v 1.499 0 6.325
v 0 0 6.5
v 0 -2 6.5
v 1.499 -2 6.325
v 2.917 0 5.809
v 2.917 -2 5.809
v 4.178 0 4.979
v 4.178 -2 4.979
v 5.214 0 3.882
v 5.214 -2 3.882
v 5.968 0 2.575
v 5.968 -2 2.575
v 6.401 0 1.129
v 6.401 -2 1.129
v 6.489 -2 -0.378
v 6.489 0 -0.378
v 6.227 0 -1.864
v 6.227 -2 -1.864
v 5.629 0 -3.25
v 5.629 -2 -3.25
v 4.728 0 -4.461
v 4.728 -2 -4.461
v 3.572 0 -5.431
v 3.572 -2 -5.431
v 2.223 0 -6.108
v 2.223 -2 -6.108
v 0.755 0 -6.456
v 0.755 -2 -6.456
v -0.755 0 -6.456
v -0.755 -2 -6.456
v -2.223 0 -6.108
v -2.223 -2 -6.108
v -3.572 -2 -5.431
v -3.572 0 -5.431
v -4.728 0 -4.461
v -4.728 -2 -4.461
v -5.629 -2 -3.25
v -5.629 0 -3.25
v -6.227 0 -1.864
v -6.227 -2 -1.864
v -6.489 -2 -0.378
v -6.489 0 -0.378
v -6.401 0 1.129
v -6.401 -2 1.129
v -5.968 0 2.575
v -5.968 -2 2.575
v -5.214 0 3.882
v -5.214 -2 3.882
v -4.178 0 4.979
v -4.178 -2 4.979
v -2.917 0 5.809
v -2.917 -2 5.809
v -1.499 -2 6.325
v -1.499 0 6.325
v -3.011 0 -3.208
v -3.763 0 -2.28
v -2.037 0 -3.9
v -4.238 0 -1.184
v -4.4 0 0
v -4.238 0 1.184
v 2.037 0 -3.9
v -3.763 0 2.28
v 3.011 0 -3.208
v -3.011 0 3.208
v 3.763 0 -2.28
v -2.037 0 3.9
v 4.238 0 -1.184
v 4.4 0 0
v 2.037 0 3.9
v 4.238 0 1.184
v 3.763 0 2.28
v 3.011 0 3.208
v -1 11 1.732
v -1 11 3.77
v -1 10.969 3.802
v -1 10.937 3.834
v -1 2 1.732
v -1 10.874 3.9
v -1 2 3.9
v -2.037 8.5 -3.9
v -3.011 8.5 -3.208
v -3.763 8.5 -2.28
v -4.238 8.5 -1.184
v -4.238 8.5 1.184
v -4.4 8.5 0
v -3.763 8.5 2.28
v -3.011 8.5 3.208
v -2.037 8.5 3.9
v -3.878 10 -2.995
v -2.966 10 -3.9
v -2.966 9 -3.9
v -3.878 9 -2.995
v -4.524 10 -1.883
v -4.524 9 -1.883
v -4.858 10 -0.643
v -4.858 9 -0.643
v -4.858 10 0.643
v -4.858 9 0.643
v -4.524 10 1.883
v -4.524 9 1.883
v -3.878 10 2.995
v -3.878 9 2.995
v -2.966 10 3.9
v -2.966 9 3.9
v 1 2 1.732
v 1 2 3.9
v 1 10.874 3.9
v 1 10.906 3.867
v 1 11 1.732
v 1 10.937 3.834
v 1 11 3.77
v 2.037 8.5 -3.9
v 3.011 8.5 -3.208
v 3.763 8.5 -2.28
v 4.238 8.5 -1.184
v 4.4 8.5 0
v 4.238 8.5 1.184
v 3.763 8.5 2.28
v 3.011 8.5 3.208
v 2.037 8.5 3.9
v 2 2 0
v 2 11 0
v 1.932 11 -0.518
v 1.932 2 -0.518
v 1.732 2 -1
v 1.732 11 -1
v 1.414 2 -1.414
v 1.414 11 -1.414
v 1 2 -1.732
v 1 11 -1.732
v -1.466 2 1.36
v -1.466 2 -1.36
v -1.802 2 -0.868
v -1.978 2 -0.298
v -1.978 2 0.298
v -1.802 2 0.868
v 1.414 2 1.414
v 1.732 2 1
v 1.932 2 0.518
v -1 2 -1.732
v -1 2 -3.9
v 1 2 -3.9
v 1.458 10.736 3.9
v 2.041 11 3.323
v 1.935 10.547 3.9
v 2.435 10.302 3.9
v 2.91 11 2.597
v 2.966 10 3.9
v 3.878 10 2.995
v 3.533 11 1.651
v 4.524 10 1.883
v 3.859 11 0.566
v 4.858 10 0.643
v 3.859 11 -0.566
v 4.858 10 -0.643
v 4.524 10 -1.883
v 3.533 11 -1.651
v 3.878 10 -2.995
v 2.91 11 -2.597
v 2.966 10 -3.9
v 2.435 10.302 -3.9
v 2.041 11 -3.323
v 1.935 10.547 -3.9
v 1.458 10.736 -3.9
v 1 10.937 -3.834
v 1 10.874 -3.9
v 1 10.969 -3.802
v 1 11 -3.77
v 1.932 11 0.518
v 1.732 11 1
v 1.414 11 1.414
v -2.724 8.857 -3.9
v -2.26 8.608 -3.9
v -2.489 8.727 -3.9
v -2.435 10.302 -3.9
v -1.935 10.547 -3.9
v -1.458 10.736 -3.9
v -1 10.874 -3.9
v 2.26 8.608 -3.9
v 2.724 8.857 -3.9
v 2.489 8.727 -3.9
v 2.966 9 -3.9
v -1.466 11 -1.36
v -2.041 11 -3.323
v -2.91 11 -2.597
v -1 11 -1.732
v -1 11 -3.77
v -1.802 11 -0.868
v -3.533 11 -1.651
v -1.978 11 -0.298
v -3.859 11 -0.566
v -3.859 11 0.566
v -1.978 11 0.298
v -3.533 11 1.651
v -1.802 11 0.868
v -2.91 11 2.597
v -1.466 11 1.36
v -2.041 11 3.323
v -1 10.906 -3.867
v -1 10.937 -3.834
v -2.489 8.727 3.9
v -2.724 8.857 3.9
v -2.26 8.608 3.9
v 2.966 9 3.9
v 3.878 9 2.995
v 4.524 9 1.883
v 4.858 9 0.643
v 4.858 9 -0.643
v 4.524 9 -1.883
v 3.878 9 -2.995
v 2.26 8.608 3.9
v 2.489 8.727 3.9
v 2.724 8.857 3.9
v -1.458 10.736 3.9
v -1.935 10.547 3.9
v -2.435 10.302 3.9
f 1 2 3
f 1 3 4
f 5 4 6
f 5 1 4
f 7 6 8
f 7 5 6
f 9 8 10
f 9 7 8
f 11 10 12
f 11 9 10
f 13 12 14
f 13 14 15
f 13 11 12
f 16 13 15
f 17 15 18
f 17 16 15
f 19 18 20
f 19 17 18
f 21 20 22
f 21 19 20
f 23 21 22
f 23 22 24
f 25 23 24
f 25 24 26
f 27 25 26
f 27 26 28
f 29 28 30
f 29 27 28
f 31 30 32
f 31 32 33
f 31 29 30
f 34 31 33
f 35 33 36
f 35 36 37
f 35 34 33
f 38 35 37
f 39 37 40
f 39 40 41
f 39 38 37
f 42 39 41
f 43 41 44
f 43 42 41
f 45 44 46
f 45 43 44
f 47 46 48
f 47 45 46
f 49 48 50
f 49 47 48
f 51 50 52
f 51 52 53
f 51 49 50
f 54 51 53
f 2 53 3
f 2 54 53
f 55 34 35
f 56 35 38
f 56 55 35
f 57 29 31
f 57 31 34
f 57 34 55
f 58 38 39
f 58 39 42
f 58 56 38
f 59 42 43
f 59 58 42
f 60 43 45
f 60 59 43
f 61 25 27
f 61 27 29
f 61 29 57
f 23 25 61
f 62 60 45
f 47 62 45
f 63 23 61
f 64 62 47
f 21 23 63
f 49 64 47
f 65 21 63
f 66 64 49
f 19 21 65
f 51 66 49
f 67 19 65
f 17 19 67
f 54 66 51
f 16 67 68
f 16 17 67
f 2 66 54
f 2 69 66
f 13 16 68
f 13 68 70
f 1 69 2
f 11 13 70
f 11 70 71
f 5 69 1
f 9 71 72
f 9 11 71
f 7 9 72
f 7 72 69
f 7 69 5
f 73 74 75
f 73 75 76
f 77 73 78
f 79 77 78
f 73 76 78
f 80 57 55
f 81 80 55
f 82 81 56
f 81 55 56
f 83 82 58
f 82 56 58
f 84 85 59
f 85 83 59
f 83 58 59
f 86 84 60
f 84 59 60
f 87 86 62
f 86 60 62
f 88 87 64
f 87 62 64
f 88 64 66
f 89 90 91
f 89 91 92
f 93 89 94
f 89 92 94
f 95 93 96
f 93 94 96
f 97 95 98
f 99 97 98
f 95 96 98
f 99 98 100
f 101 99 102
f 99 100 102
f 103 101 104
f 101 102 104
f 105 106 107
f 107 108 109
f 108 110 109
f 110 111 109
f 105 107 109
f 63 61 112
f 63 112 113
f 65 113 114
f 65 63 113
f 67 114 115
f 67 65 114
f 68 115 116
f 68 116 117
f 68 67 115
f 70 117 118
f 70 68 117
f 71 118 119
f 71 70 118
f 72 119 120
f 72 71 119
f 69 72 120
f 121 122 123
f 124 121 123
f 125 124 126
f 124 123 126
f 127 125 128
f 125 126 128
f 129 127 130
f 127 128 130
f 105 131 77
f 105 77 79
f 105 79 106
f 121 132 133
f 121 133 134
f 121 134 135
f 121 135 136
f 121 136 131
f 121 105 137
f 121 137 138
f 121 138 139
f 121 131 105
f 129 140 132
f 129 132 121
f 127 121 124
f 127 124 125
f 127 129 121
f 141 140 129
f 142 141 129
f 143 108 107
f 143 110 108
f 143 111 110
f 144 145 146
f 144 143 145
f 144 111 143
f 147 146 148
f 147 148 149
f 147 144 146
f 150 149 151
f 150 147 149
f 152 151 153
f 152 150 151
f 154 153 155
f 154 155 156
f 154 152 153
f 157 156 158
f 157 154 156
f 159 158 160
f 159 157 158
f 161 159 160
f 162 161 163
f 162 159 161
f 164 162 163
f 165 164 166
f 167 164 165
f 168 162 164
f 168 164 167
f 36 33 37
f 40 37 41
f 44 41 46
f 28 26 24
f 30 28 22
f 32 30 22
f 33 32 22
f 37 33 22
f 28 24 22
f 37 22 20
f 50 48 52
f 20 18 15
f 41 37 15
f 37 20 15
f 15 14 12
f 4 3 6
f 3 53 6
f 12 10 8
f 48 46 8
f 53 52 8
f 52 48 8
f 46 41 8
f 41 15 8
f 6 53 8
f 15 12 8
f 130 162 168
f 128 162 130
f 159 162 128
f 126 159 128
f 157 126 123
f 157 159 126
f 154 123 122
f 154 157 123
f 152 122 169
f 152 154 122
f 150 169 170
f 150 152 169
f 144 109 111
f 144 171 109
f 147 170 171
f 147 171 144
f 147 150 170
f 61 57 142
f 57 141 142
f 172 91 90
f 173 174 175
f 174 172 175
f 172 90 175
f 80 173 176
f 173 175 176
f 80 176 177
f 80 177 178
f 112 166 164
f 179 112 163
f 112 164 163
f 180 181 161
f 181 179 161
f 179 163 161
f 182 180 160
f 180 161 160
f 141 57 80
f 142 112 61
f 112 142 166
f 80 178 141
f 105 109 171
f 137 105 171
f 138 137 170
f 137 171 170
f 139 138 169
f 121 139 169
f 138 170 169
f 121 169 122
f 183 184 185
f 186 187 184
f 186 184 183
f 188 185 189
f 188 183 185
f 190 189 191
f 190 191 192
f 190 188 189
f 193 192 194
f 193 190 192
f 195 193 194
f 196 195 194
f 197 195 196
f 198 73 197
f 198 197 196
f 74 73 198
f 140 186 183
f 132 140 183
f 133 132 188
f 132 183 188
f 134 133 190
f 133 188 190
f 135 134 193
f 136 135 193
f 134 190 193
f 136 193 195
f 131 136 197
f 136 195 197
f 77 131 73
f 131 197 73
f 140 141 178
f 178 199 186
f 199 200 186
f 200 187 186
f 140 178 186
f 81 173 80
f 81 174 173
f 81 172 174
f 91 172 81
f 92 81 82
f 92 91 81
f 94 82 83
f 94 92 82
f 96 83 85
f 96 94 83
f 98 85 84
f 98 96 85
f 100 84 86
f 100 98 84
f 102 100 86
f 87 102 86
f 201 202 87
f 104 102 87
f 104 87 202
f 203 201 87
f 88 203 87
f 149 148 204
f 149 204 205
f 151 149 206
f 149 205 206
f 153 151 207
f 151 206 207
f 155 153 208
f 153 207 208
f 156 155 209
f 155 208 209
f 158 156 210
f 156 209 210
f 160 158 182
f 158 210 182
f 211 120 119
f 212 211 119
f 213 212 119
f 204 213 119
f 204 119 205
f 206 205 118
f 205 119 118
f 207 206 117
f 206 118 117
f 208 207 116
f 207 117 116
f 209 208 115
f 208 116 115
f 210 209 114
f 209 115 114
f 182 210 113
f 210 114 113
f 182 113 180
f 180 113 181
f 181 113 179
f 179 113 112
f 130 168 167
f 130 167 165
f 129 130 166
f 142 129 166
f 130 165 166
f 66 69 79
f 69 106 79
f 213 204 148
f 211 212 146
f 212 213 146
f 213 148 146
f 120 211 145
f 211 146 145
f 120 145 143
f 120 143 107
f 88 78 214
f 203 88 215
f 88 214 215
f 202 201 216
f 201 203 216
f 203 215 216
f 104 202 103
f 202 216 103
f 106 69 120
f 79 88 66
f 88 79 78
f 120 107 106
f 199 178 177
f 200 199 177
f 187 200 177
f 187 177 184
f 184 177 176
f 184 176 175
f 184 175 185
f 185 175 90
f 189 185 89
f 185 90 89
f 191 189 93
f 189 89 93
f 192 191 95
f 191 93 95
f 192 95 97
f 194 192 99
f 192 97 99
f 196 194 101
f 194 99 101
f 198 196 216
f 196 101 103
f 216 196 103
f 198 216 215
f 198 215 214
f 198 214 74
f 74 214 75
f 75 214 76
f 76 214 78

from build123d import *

# Parameters (mm, degrees)
ESBO_O1_R                = 6.5
RESSALTO_EXTRUS_O1_DEPTH = 2
ESBO_O2_R                = 4.4
RESSALTO_EXTRUS_O2_DEPTH = 8
ESBO_O3_R                = 4.9
RESSALTO_EXTRUS_O3_DEPTH = 3
CORTE_EXTRUS_O1_REACH    = 17.922
CORTE_EXTRUS_O2_DEPTH    = 9
CHANFRO1_SIZE            = 1


with BuildPart() as part:
    # Esboço1 → Ressalto-extrusão1 (new body)
    with BuildSketch(Plane(origin=(0, 0, 0), x_dir=(1, 0, 0), z_dir=(0, 1, 0))):
        with Locations(Location((0, 0, 0), (0, 0, 270))):
            Circle(ESBO_O1_R)
    extrude(amount=-RESSALTO_EXTRUS_O1_DEPTH)

    # Esboço2 → Ressalto-extrusão2 (add)
    with BuildSketch(Plane(origin=(0, 0, 0), x_dir=(1, 0, 0), z_dir=(0, 1, 0))):
        with Locations(Location((0, 0, 0), (0, 0, 270))):
            Circle(ESBO_O2_R)
    extrude(amount=RESSALTO_EXTRUS_O2_DEPTH)

    # Esboço3 → Ressalto-extrusão3 (add)
    with BuildSketch(Plane(origin=(0, 8, 0), x_dir=(1, 0, 0), z_dir=(0, 1, 0))):
        with Locations(Location((0, 0, 0), (0, 0, 270))):
            Circle(ESBO_O3_R)
    extrude(amount=RESSALTO_EXTRUS_O3_DEPTH)

    # Corte-extrusão1: up to this face of the body (flat: up to its plane)
    corte_extrus_o1_end = Plane(part.part.faces().sort_by_distance((0, 0, -6.316152237))[0])
    # Esboço4 → Corte-extrusão1 (cut, up to the picked face)
    with BuildSketch(Plane(origin=(0, 11, 0), x_dir=(1, 0, 0), z_dir=(0, 1, 0)), mode=Mode.PRIVATE) as corte_extrus_o1_sk1:
        with BuildLine():
            Line((2.966479395, -3.9), (-2.966479395, -3.9))
            ThreePointArc((-2.966479395, -3.9), (0, -4.9), (2.966479395, -3.9))
        make_face()
    corte_extrus_o1_tool1 = split(extrude(corte_extrus_o1_sk1.sketch, amount=-CORTE_EXTRUS_O1_REACH, mode=Mode.PRIVATE), bisect_by=corte_extrus_o1_end, keep=Keep.BOTH, mode=Mode.PRIVATE)
    # Esboço4 → Corte-extrusão1 (cut, up to the picked face)
    with BuildSketch(Plane(origin=(0, 11, 0), x_dir=(1, 0, 0), z_dir=(0, 1, 0)), mode=Mode.PRIVATE) as corte_extrus_o1_sk2:
        with BuildLine():
            ThreePointArc((2.966479395, 3.9), (0, 4.9), (-2.966479395, 3.9))
            Line((-2.966479395, 3.9), (2.966479395, 3.9))
        make_face()
    corte_extrus_o1_tool2 = split(extrude(corte_extrus_o1_sk2.sketch, amount=-CORTE_EXTRUS_O1_REACH, mode=Mode.PRIVATE), bisect_by=corte_extrus_o1_end, keep=Keep.BOTH, mode=Mode.PRIVATE)
    add(corte_extrus_o1_tool1.solids().sort_by(Axis((0, 11, 4.303719), (0, -1, 0)))[0], mode=Mode.SUBTRACT)
    add(corte_extrus_o1_tool2.solids().sort_by(Axis((0, 11, -4.303719), (0, -1, 0)))[0], mode=Mode.SUBTRACT)

    # Esboço5 → Corte-extrusão2 (cut)
    with BuildSketch(Plane(origin=(0, 11, 0), x_dir=(1, 0, 0), z_dir=(0, 1, 0))):
        with BuildLine():
            Line((0, 2), (0, 3.9))
            Line((0, 3.9), (-1, 3.9))
            Line((-1, 3.9), (-1, 1.732050808))
            ThreePointArc((-1, 1.732050808), (-0.51763809, 1.931851653), (0, 2))
        make_face()
        with BuildLine():
            Line((1, 3.9), (0, 3.9))
            Line((0, 3.9), (0, 2))
            ThreePointArc((0, 2), (0.51763809, 1.931851653), (1, 1.732050808))
            Line((1, 1.732050808), (1, 3.9))
        make_face()
        with BuildLine():
            Line((0, -3.9), (0, -2))
            ThreePointArc((0, -2), (-0.51763809, -1.931851653), (-1, -1.732050808))
            Line((-1, -1.732050808), (-1, -3.9))
            Line((-1, -3.9), (0, -3.9))
        make_face()
        with BuildLine():
            ThreePointArc((1, -1.732050808), (0.51763809, -1.931851653), (0, -2))
            Line((0, -2), (0, -3.9))
            Line((0, -3.9), (1, -3.9))
            Line((1, -3.9), (1, -1.732050808))
        make_face()
        with BuildLine():
            Line((0, -2), (0, 2))
            ThreePointArc((0, 2), (-0.51763809, 1.931851653), (-1, 1.732050808))
            Line((-1, 1.732050808), (-1, -1.732050808))
            ThreePointArc((-1, -1.732050808), (-0.51763809, -1.931851653), (0, -2))
        make_face()
        with BuildLine():
            ThreePointArc((1, 1.732050808), (0.51763809, 1.931851653), (0, 2))
            Line((0, 2), (0, -2))
            ThreePointArc((0, -2), (0.51763809, -1.931851653), (1, -1.732050808))
            Line((1, -1.732050808), (1, 1.732050808))
        make_face()
        with BuildLine():
            Line((-1, -1.732050808), (-1, 1.732050808))
            ThreePointArc((-1, 1.732050808), (-2, 0), (-1, -1.732050808))
        make_face()
        with BuildLine():
            ThreePointArc((2, 0), (1.732050808, 1), (1, 1.732050808))
            Line((1, 1.732050808), (1, -1.732050808))
            ThreePointArc((1, -1.732050808), (1.732050808, -1), (2, 0))
        make_face()
    extrude(amount=-CORTE_EXTRUS_O2_DEPTH, mode=Mode.SUBTRACT)

    # Chanfro1
    # the kernel refuses this chamfer: 1 mm, written as the material it takes off along each edge
    with BuildSketch(Plane(origin=(0, 8, 0), x_dir=(0.12482395655997021, 0, 0.9921789051722048), z_dir=(-0.9921789051722048, 0, 0.12482395655997021))) as chanfro1_piece_1_section:
        Polygon((4.9, CHANFRO1_SIZE), (4.9 - CHANFRO1_SIZE, 0), (4.9, 0), align=None)
    chanfro1_piece_1 = revolve(axis=Axis((0, 8, 0), (0, 1, 0)), revolution_arc=165.658820776, mode=Mode.PRIVATE)
    chanfro1_piece_1 = chanfro1_piece_1 - Plane(origin=(0, 8.751624074, 0), x_dir=(0, 0, 1), z_dir=(0, -1, 0)) * Cylinder(4.4, 20, mode=Mode.PRIVATE)
    add(chanfro1_piece_1, mode=Mode.SUBTRACT)
    with BuildSketch(Plane(origin=(0, 8, 0), x_dir=(-0.12482395656001569, 0, -0.9921789051721989), z_dir=(0.9921789051721989, 0, -0.12482395656001569))) as chanfro1_piece_2_section:
        Polygon((4.9 - CHANFRO1_SIZE, 0), (4.9, CHANFRO1_SIZE), (4.9, 0), align=None)
    chanfro1_piece_2 = revolve(axis=Axis((0, 8, 0), (0, 1, 0)), revolution_arc=165.658820776, mode=Mode.PRIVATE)
    chanfro1_piece_2 = chanfro1_piece_2 - Plane(origin=(0, 8.751624074, 0), x_dir=(0, 0, 1), z_dir=(0, -1, 0)) * Cylinder(4.4, 20, mode=Mode.PRIVATE)
    add(chanfro1_piece_2, mode=Mode.SUBTRACT)
    with BuildSketch(Plane(origin=(0, 11, 0), x_dir=(-0.124823956560002, 0, -0.9921789051722005), z_dir=(0.9921789051722005, 0, -0.124823956560002))) as chanfro1_piece_3:
        Polygon((4.9 - CHANFRO1_SIZE, 0), (4.9, -CHANFRO1_SIZE), (4.9, 0), align=None)
    revolve(axis=Axis((0, 11, 0), (0, 1, 0)), revolution_arc=165.658820776, mode=Mode.SUBTRACT)
    with BuildSketch(Plane(origin=(0, 11, 0), x_dir=(0.12482395656000247, 0, 0.9921789051722005), z_dir=(-0.9921789051722005, 0, 0.12482395656000247))) as chanfro1_piece_4:
        Polygon((4.9, -CHANFRO1_SIZE), (4.9 - CHANFRO1_SIZE, 0), (4.9, 0), align=None)
    revolve(axis=Axis((0, 11, 0), (0, 1, 0)), revolution_arc=165.658820776, mode=Mode.SUBTRACT)


solid = part.part
